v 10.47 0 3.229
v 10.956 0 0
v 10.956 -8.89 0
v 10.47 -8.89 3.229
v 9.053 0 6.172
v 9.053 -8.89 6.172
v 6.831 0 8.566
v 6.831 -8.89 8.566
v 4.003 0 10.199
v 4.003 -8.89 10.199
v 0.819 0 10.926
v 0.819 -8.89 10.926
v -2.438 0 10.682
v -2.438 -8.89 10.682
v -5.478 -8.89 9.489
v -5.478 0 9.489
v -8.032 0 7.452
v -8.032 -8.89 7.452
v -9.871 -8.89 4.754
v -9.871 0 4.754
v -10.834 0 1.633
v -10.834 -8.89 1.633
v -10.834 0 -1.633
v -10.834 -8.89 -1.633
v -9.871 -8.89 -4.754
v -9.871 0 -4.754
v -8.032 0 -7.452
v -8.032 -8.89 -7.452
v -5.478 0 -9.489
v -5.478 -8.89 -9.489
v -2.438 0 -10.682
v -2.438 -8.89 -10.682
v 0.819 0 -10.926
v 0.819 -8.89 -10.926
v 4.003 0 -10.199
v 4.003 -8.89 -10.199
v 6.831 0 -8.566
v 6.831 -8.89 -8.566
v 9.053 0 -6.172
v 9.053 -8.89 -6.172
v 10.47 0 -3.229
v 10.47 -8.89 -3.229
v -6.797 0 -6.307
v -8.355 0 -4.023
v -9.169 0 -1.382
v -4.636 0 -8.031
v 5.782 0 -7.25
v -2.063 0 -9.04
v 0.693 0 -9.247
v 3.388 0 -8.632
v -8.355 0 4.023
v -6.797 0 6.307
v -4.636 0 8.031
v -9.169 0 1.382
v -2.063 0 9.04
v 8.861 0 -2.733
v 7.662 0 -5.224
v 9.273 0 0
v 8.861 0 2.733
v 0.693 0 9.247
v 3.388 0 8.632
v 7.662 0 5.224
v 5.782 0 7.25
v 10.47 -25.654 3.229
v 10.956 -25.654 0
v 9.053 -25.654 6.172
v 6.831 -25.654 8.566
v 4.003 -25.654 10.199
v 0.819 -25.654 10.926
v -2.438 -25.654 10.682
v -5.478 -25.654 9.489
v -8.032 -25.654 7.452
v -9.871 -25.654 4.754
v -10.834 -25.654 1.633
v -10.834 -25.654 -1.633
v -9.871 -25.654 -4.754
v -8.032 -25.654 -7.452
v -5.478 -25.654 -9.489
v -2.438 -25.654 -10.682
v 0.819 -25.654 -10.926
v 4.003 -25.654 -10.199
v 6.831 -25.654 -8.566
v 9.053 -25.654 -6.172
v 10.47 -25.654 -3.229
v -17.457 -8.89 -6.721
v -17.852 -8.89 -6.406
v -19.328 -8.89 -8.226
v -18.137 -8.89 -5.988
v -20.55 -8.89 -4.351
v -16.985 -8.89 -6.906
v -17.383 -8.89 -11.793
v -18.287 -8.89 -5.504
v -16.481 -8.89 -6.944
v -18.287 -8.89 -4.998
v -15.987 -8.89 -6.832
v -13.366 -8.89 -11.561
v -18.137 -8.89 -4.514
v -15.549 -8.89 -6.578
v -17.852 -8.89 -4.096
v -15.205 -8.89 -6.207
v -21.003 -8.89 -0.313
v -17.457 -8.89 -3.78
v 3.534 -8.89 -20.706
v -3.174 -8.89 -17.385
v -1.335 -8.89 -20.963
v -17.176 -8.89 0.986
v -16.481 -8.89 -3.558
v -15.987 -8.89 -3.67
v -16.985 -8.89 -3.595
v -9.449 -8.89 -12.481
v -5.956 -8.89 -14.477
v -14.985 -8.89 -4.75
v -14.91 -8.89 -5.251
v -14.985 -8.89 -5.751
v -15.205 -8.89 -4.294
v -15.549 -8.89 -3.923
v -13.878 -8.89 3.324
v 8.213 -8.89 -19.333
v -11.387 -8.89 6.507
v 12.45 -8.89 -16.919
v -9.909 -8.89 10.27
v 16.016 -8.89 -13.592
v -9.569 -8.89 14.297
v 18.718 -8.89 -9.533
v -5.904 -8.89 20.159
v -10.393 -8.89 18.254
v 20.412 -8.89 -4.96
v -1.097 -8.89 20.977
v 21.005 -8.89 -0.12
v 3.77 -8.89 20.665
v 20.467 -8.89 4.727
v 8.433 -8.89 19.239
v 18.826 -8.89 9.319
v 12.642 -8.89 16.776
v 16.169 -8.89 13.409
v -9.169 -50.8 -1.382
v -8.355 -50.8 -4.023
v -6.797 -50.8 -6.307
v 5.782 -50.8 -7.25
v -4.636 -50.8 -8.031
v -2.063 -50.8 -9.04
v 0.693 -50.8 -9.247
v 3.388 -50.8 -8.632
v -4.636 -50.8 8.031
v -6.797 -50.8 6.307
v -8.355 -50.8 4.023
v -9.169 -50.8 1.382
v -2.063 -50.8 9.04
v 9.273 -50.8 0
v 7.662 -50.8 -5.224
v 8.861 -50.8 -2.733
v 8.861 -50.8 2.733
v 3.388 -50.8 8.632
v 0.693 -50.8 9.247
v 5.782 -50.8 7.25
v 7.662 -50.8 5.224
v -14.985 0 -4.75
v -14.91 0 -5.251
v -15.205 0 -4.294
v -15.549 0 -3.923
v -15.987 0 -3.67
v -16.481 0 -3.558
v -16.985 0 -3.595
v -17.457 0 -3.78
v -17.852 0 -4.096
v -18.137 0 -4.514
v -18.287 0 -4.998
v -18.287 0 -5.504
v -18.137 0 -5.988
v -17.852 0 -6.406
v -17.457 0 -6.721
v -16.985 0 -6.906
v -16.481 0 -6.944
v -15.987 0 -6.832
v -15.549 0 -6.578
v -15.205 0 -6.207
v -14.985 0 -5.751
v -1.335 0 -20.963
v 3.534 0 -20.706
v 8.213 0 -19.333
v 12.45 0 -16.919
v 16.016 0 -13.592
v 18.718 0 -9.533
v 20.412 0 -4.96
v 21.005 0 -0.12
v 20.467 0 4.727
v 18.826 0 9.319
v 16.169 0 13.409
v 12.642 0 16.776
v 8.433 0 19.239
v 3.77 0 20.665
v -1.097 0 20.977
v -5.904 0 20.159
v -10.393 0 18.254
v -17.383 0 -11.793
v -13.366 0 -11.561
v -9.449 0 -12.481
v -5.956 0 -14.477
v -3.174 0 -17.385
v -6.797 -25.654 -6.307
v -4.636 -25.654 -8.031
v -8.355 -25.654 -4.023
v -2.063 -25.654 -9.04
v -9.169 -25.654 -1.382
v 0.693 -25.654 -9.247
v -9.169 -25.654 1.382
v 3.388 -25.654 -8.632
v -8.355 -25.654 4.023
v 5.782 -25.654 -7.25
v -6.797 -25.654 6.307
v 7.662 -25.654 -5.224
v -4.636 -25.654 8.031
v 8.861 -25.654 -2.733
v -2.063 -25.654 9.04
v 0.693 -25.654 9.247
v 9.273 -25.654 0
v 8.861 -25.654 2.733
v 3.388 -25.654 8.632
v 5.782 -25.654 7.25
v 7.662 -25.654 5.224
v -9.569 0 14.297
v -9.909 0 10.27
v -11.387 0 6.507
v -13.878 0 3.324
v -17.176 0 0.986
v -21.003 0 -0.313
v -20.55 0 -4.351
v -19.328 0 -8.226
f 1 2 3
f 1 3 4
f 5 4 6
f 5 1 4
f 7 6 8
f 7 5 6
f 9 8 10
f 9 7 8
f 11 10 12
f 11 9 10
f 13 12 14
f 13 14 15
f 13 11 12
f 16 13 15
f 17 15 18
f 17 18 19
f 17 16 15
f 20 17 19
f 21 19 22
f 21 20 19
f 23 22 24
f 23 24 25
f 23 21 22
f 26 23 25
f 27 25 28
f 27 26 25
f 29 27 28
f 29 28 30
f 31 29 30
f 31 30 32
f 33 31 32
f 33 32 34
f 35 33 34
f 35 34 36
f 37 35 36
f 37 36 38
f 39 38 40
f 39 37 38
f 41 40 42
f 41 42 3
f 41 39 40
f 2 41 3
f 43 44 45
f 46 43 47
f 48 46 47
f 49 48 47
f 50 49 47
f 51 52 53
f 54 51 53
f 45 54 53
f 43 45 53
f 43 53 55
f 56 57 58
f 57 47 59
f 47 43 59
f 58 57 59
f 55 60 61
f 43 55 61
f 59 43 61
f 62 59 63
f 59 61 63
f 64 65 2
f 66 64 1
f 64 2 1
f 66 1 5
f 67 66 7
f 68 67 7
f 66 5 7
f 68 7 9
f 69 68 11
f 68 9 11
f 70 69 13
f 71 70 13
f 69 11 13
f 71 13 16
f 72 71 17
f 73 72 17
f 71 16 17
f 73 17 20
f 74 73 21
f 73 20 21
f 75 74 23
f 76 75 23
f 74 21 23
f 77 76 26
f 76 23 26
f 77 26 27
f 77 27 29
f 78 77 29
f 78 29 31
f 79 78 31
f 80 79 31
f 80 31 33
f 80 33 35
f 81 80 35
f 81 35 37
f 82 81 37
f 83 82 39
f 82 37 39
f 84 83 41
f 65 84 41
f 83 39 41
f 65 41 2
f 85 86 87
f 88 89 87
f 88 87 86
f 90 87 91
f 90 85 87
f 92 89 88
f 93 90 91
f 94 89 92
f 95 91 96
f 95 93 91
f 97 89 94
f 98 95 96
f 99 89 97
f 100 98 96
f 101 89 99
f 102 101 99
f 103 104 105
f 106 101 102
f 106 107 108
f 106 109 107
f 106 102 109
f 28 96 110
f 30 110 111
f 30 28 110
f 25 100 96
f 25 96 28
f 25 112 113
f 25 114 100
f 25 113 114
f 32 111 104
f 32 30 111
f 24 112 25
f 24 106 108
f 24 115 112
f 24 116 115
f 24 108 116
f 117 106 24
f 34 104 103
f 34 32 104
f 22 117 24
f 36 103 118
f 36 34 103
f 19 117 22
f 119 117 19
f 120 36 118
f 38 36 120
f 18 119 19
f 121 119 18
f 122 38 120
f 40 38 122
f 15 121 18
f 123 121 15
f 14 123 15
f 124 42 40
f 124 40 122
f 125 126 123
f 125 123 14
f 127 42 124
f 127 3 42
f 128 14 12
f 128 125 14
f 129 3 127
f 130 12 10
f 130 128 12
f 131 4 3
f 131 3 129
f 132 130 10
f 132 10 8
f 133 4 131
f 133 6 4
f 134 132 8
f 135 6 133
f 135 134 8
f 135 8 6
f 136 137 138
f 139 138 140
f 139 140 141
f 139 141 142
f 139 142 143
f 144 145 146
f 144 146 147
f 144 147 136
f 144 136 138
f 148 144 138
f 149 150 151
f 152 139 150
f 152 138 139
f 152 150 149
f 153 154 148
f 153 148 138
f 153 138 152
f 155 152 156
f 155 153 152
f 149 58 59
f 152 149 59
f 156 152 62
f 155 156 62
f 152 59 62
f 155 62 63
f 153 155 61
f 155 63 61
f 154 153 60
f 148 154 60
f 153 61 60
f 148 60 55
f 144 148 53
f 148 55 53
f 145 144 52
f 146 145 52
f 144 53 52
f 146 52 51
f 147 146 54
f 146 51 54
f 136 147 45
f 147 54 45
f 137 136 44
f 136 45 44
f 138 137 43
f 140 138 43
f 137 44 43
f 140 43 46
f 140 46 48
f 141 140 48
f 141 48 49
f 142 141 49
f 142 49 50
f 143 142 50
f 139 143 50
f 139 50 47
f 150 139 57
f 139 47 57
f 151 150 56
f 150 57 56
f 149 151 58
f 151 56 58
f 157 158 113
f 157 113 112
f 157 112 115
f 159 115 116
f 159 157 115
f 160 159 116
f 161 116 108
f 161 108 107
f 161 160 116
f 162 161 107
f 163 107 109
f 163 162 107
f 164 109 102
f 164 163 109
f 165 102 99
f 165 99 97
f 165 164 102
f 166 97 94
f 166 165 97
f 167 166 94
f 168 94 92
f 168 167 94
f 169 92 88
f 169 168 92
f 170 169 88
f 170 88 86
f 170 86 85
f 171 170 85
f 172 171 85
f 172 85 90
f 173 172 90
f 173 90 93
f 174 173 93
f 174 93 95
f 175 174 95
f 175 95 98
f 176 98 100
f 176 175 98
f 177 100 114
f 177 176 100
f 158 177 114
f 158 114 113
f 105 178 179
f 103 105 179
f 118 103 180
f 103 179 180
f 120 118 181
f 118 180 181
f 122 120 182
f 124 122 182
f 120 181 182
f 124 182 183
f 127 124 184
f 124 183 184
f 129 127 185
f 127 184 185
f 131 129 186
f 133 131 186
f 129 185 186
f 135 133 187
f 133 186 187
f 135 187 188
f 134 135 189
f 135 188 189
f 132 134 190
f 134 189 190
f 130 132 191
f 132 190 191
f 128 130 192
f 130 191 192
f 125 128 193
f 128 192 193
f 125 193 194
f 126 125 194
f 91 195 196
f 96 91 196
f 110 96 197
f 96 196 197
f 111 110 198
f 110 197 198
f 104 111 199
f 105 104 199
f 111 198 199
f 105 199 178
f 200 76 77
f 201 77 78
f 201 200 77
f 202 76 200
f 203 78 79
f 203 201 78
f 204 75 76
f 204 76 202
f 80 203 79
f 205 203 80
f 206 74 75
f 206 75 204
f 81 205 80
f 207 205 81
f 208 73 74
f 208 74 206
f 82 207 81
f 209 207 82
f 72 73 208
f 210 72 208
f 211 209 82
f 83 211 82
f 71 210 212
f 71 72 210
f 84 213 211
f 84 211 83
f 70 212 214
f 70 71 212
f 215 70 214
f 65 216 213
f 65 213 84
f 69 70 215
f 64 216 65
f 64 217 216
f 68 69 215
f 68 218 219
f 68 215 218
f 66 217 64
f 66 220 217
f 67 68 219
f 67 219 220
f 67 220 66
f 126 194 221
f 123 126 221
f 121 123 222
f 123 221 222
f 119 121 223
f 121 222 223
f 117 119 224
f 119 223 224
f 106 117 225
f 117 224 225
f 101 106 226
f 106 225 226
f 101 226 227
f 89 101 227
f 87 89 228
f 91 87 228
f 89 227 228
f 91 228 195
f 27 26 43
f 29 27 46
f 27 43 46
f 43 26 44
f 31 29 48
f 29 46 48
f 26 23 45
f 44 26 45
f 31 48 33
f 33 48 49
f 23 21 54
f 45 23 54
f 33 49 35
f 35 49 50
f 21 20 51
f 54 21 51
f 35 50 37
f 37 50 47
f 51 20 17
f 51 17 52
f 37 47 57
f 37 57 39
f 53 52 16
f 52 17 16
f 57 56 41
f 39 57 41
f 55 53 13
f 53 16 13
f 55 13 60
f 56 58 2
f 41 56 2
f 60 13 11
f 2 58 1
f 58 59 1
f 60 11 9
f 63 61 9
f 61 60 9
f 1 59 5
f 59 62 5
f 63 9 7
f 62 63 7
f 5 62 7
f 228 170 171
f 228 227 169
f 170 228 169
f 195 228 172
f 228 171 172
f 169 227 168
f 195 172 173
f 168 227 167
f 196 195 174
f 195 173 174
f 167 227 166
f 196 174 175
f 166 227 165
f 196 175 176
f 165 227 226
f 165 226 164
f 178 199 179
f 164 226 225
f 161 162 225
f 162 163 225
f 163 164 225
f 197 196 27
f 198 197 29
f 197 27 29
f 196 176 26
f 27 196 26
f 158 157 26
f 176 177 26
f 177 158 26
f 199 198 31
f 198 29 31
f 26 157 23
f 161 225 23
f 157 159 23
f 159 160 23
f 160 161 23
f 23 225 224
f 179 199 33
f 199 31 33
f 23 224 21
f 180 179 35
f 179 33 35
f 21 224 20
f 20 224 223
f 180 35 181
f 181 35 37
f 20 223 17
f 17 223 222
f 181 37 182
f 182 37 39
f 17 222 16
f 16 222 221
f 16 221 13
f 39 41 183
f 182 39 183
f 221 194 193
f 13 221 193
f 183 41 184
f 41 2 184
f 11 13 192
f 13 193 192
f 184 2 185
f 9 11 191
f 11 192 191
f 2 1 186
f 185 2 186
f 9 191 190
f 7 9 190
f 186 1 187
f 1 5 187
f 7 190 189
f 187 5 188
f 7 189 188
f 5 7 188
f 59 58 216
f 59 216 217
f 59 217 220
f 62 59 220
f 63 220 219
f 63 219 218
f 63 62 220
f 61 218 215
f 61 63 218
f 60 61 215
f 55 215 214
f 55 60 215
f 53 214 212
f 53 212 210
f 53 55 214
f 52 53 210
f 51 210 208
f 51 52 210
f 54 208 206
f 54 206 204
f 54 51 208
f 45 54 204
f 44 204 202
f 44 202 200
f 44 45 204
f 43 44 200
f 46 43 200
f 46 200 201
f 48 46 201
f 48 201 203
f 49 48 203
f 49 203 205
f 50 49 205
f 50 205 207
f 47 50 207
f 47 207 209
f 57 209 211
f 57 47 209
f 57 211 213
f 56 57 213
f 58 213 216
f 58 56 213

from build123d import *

# Parameters (mm, degrees)
F0_R     = 9.272864
F1_DEPTH = 50.8
F0_R_2   = 1.698052
F0_R_3   = 10.956447
F2_DEPTH = 8.89
F3_DEPTH = 25.654


with BuildPart() as f1:
    # F0 (on Front) → F1 (new body)
    with BuildSketch(Plane.XZ):
        Circle(F0_R)
    extrude(amount=F1_DEPTH)


with BuildPart() as f2:
    # F0 (on Front) → F2 (new body)
    with BuildSketch(Plane.XZ):
        with BuildLine():
            ThreePointArc((-17.382682, -11.793472), (-7.630108, -13.352688), (-1.335478, -20.963304))
            ThreePointArc((-1.335478, -20.963304), (20.467017, 4.727035), (-10.393163, 18.254473))
            ThreePointArc((-10.393163, 18.254473), (-11.387141, 6.507182), (-21.00347, -0.312866))
            ThreePointArc((-21.00347, -0.312866), (-20.033104, -6.3181), (-17.382682, -11.793472))
        make_face()
        with Locations((-16.60759, -5.250861)):
            Circle(F0_R_2, mode=Mode.SUBTRACT)
        Circle(F0_R_3, mode=Mode.SUBTRACT)
    extrude(amount=F2_DEPTH)


with BuildPart() as f3:
    # F0 (on Front) → F3 (new body)
    with BuildSketch(Plane.XZ):
        Circle(F0_R_3)
        Circle(F0_R, mode=Mode.SUBTRACT)
    extrude(amount=F3_DEPTH)


solid = Compound([f1.part, f2.part, f3.part])
